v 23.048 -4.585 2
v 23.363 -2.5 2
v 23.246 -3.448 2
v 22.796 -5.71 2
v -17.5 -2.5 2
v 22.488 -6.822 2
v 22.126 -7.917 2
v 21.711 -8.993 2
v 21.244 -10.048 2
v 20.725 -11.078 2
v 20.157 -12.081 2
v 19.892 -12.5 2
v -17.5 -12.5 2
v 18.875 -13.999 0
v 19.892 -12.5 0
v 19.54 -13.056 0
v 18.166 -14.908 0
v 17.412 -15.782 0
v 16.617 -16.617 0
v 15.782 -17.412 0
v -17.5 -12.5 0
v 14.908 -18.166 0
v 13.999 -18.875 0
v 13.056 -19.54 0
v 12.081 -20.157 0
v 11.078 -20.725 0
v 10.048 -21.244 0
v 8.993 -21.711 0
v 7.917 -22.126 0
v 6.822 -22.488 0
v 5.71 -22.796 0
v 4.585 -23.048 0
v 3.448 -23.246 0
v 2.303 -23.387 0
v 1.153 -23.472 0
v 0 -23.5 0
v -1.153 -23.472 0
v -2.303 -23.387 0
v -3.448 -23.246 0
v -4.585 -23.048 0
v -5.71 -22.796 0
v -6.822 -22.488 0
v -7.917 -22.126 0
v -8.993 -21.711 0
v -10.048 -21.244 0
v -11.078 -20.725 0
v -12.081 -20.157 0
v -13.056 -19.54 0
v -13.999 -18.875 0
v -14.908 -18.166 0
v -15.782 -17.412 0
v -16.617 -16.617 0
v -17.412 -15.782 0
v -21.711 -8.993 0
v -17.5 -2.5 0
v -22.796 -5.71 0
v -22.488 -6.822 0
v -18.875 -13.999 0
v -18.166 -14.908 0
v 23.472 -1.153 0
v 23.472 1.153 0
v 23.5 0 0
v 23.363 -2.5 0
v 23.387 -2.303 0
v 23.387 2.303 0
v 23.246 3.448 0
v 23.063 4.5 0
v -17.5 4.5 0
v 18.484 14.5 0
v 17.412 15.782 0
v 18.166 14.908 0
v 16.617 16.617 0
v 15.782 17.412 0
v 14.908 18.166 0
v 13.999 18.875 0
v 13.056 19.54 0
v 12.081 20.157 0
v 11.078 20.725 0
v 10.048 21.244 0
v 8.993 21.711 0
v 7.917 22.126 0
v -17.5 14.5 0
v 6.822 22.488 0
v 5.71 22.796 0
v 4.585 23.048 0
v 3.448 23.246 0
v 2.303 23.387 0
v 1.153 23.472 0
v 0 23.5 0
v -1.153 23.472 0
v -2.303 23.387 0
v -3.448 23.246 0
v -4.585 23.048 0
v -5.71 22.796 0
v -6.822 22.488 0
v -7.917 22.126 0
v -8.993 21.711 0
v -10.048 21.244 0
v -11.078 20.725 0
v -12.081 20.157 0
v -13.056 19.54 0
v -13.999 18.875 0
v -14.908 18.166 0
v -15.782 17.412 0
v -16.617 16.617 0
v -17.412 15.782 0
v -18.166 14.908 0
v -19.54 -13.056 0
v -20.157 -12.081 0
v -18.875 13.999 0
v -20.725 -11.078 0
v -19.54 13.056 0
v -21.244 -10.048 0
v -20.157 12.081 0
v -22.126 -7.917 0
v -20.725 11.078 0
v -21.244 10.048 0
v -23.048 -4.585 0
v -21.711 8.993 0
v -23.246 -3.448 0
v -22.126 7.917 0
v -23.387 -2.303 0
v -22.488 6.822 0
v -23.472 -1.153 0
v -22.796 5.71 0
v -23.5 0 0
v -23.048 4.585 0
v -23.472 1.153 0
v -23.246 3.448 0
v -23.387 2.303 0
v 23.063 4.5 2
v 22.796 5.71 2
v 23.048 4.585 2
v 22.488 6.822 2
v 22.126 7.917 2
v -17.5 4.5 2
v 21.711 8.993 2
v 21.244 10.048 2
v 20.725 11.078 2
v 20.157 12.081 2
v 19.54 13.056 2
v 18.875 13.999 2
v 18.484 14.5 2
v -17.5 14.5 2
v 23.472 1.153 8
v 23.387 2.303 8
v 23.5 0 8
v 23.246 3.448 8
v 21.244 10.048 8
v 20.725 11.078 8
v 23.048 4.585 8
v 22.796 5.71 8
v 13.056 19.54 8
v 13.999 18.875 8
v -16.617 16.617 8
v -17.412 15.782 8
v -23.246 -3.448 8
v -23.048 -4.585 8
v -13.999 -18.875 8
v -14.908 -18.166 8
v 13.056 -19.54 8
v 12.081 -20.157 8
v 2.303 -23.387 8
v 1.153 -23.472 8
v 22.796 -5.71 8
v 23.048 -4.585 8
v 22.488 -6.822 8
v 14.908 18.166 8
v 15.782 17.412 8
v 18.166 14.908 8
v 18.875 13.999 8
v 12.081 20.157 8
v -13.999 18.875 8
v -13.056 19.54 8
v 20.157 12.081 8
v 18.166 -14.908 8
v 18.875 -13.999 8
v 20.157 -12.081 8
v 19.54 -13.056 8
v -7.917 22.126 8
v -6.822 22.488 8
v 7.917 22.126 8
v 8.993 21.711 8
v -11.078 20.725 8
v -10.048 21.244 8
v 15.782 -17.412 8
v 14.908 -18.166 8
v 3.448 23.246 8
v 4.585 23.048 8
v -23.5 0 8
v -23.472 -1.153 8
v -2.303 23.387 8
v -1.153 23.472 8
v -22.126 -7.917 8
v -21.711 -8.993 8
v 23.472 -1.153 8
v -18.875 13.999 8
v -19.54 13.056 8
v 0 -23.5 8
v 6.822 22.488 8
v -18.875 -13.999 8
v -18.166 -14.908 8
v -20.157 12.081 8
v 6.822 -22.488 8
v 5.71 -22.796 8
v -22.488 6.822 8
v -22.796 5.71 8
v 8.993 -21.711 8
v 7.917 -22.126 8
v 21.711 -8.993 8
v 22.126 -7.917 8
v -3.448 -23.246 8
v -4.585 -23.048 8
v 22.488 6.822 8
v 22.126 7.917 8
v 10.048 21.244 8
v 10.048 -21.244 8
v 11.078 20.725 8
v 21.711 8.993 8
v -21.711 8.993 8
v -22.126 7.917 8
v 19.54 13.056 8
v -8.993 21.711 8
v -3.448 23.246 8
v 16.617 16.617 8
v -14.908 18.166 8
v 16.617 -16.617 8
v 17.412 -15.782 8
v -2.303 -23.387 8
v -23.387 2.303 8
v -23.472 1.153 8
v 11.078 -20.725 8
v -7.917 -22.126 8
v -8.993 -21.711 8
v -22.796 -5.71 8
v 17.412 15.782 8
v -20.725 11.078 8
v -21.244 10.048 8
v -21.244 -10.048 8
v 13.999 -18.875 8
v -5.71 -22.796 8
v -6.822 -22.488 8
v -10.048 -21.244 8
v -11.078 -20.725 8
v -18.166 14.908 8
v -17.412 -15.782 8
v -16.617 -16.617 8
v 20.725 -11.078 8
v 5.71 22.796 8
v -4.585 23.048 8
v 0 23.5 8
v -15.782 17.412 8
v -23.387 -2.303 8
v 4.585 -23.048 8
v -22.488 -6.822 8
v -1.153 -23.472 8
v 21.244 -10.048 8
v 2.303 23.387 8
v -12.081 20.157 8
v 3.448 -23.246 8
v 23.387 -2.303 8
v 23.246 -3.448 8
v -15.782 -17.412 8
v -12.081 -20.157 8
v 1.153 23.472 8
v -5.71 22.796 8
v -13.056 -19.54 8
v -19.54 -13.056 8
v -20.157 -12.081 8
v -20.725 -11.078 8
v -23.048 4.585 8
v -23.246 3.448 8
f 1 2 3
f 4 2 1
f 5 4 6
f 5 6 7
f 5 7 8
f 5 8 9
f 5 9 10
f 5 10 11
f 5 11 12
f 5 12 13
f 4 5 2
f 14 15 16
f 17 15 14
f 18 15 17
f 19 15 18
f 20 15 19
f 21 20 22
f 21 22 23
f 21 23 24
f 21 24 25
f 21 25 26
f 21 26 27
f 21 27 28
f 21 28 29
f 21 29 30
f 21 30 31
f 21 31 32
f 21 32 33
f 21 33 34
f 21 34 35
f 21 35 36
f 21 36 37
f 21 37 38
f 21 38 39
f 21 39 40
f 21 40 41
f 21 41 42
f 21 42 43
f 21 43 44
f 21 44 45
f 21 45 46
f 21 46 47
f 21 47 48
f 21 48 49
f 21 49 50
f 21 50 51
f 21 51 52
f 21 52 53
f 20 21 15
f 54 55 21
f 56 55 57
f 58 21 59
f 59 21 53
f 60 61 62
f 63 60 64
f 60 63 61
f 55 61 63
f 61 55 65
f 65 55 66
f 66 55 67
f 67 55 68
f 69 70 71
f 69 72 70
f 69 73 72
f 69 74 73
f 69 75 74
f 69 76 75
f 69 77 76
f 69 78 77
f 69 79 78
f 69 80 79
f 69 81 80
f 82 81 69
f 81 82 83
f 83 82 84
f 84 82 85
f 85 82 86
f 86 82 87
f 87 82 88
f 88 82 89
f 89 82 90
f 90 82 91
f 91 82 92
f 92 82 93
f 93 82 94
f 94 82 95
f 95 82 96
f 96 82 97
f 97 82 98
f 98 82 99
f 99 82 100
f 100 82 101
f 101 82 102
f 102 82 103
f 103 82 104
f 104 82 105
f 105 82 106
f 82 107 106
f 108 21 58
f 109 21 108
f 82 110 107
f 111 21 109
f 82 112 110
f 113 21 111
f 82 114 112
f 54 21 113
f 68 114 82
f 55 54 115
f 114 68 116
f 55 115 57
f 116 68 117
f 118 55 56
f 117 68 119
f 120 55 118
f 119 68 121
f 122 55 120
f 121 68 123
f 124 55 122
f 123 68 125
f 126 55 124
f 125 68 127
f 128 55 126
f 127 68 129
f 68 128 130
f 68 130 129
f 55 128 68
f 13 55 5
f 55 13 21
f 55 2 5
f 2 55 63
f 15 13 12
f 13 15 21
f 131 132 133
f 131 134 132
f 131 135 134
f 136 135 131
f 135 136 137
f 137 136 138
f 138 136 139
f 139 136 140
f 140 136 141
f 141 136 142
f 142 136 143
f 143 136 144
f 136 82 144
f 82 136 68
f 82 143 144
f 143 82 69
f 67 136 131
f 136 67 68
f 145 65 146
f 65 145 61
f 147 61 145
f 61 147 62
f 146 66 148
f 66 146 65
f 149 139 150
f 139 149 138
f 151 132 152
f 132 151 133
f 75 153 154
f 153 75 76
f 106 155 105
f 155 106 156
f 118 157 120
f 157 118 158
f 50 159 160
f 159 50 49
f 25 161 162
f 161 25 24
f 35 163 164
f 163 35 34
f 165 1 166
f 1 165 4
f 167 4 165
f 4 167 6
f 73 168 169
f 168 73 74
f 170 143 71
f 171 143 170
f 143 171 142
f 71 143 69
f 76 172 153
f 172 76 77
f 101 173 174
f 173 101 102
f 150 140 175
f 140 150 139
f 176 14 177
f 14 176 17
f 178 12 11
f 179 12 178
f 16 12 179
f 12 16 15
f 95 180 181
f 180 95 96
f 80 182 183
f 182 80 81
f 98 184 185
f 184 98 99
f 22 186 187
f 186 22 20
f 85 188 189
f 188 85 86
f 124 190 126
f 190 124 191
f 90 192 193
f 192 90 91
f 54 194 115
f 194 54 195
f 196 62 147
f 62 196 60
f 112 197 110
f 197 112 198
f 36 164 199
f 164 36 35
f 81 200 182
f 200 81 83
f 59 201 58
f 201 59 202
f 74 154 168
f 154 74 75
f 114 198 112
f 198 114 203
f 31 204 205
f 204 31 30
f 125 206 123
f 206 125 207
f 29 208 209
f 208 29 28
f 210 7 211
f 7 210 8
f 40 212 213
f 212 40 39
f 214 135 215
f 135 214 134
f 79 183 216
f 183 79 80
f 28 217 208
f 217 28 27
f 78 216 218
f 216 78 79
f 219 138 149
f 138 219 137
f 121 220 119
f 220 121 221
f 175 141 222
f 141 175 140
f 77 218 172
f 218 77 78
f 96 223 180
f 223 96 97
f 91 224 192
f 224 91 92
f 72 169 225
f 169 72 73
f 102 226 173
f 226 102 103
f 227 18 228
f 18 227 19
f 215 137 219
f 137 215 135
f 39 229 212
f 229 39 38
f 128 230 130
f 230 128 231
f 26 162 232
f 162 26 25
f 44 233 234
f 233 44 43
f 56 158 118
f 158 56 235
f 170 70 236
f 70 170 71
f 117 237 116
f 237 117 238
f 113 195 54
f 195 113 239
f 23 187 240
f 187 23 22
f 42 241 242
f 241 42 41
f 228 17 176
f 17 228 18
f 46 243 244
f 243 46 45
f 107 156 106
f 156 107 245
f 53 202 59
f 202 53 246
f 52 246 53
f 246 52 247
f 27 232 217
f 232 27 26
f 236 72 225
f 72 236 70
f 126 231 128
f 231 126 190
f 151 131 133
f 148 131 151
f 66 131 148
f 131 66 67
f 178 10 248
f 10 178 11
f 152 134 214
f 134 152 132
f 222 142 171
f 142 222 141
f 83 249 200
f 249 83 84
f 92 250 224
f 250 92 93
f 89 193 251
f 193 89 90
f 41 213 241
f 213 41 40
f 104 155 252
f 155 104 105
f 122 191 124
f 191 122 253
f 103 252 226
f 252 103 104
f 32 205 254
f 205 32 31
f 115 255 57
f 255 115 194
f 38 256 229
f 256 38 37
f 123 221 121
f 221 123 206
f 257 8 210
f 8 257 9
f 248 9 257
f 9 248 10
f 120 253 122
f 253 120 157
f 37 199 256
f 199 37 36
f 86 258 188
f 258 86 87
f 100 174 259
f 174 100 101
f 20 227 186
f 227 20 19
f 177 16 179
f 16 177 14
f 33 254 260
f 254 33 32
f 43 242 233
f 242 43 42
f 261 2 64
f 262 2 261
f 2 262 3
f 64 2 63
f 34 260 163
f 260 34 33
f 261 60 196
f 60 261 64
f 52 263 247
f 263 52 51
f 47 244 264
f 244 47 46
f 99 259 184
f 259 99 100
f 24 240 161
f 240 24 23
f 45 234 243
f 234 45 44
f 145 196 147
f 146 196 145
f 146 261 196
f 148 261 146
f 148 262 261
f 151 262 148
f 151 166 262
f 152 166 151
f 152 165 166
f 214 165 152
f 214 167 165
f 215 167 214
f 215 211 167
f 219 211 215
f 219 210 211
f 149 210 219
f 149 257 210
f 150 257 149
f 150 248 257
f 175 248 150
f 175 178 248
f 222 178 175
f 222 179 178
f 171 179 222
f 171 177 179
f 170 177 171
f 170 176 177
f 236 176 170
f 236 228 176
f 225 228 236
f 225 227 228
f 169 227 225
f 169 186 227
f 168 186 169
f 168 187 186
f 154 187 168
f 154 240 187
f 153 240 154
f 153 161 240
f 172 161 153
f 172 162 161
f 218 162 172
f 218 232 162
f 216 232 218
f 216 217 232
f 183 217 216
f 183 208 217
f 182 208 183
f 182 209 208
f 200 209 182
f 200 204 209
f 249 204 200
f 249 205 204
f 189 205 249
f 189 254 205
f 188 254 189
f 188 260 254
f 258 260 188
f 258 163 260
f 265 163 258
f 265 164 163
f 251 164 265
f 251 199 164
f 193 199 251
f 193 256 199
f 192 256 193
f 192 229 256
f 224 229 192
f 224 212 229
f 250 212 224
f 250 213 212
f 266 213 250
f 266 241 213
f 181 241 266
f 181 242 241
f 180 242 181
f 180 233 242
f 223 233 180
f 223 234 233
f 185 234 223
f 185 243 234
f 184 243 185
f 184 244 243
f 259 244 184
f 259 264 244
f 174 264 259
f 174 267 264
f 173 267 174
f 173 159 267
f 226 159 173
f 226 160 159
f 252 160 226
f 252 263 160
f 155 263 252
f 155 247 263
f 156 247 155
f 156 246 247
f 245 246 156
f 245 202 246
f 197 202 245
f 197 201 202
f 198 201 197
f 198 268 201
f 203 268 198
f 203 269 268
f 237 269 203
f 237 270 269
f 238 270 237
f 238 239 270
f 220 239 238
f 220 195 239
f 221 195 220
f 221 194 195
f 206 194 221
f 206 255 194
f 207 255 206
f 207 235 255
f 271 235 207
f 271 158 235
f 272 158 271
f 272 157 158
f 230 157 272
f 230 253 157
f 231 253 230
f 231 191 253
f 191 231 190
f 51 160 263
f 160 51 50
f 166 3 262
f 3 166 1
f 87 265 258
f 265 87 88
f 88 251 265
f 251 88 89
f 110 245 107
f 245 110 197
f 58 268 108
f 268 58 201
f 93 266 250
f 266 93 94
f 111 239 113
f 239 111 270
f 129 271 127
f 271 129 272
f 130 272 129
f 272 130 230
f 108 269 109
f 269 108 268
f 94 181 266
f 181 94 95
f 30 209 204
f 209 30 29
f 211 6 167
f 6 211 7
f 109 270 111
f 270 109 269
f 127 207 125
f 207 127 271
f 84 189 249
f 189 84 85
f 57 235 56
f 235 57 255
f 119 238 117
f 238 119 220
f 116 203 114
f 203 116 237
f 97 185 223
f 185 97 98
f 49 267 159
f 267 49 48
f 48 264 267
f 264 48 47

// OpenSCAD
module mask() {

difference() {
	cylinder(r=25, h=1, $fn=128);

	translate([0,0,-1]) linear_extrude(height = 4.5, center = false, convexity = 10) 
		scale([0.4, 0.4]) rotate([0,180]) import (file = "tellulogo.dxf", layer="tellu2", $fn=128);
}

difference() {
	cylinder(r=25, h=5, $fn=128);
	translate([0,0,-1]) cylinder(r=24, h=10, $fn=128);
}
/*
difference() {

	union() {
		translate([-18+1, -2, 0]) rotate([0,30,0]) translate([-2, 0, 0]) cube([2,4,12]);
		translate([18-1, -2, 0]) rotate([0,-30,0]) cube([2,4,12]);
		translate([-25.5/2, -2, 10])  cube([25.5,4,1.5]);
	}

	translate([-30,-30,11.5]) cube([60,60,10]);
}
*/

}

module diffuser() {

	difference() {
		union() {
			cylinder(r=23.5, h=8, $fn=128);
			//translate([0,0,0]) linear_extrude(height = 6, center = false, convexity = 10) 
			//	scale([0.39, 0.39]) import (file = "tellulogo.dxf", layer="tellu2", $fn=128);
		}
		union() {
			translate([-35/2,-17/2-4,0])cube([45,10,2]); 

			translate([-35/2,17/2-4,0]) cube([45,10,2]);
		}
	}

}

diffuser();
//mask();
